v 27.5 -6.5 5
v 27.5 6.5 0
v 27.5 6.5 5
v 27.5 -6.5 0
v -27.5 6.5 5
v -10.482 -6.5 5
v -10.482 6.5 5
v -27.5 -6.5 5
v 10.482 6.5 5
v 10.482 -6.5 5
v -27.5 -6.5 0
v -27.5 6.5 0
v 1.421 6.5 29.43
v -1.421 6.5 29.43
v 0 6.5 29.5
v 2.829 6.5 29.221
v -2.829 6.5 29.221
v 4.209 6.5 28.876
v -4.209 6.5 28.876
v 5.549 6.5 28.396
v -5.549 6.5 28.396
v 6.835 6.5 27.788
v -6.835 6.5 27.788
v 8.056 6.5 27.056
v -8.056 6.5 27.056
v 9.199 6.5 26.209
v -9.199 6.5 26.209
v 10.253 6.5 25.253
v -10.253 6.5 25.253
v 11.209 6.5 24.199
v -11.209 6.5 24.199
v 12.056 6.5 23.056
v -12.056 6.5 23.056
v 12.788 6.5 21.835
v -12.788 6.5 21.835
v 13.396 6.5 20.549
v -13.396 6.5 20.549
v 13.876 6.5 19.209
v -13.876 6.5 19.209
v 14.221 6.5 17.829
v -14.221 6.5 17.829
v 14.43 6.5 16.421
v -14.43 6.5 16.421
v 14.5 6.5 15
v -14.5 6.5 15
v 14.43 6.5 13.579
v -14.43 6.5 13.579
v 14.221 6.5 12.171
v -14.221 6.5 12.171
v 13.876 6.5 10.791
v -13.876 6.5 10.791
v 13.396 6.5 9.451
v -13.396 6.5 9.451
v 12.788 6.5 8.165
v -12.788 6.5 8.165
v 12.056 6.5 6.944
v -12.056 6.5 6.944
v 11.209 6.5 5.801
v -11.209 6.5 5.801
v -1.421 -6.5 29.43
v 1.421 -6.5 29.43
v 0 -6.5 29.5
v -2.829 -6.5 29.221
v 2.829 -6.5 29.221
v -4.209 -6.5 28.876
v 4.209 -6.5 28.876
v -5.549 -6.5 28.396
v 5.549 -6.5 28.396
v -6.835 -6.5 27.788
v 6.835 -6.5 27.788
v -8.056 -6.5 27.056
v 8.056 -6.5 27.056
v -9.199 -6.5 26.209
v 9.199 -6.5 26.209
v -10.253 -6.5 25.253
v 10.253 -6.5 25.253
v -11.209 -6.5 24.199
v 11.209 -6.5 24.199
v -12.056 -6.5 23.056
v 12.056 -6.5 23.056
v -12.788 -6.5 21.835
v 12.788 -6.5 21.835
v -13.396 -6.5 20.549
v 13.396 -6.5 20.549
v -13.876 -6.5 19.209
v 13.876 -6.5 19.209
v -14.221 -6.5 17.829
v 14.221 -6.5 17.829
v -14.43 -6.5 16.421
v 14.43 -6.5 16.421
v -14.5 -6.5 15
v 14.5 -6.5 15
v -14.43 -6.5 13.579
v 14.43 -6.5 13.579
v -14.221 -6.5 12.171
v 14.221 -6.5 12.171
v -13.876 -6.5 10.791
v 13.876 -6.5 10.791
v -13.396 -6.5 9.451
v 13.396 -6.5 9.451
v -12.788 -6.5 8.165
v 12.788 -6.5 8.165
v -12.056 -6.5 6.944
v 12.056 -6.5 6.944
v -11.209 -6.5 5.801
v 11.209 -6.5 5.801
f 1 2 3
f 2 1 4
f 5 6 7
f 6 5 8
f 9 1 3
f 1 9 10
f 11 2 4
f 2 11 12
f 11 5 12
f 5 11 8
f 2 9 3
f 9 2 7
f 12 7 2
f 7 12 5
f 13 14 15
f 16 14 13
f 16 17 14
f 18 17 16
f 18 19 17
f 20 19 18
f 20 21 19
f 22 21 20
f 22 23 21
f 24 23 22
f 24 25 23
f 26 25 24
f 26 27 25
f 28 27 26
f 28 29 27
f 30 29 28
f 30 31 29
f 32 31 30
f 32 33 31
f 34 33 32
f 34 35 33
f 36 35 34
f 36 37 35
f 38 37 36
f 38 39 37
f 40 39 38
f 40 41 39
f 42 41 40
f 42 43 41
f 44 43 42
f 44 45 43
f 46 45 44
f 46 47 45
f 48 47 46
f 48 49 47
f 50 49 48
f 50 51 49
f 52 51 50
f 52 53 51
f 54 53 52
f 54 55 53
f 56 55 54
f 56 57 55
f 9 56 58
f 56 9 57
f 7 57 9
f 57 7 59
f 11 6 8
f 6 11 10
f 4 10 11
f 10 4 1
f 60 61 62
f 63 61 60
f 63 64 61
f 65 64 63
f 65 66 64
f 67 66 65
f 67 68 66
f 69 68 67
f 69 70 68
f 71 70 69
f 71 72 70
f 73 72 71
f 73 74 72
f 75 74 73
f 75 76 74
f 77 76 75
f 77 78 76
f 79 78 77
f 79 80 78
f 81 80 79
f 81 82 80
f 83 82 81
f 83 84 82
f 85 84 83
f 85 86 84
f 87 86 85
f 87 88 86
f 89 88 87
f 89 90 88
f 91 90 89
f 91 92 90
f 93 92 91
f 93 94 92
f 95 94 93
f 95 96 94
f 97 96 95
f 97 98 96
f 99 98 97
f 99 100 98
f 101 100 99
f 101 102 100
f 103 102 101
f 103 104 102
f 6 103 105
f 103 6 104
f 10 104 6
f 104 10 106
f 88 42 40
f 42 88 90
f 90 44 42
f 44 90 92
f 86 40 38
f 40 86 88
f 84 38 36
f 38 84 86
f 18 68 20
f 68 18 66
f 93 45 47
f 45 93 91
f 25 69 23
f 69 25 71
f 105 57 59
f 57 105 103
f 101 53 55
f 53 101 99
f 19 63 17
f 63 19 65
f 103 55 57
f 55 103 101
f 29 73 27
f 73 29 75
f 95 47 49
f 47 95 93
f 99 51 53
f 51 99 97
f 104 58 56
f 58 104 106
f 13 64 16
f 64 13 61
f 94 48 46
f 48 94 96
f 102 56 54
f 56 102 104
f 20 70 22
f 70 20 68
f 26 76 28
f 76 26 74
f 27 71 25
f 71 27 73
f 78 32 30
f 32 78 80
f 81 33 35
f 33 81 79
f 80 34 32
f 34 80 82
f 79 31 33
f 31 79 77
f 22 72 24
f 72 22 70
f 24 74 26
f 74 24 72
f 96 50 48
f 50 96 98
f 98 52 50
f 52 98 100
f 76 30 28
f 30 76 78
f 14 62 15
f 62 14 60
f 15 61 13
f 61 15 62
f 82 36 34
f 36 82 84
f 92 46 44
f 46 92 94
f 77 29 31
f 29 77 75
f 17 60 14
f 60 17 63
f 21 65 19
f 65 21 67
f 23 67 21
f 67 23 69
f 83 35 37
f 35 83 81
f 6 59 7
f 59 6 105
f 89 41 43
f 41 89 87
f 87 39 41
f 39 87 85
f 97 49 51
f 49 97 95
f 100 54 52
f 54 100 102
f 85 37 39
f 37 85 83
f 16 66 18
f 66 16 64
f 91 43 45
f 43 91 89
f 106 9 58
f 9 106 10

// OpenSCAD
/*
Author :    Guilherme Pontes (gpsgui)
github :    www.github.com/gpsgui

Release Notes

08/05/2020 -> Version 1.0.0
        Features:
            - 10 possibles presets(sk8 to sk40) of SAMICK-like SK shaft supports
            - Custom mode, generate a suport with arbitrary dimensions 
            - All holes with countersink or counterbore
            - Clamping with bolt and nut (with nut housing)
*/


/* [Hidden] */
$fn = 64;
// presets based on the catalog of zinc-die cast kp-series of Kugellager https://www.kugellager-express.de/silver-series-miniature-plummer-block-housing-unit-kp08-shaft-8-mm
// presets with parameters [ d, h, A, W, H, T, E, D, C, B, S, J ]
sk8  = [8, 20, 21, 42, 32.8, 6, 18, 5, 32, 14, 5.5, 4] ;
sk10 = [10, 20, 21, 42, 32.8, 6, 18, 5, 32, 14, 5.5, 4]; 
sk12 = [12, 23, 21, 42, 38, 6, 20, 5, 32, 14, 5.5, 4];
sk13 = [13, 23, 21, 42, 38, 6, 20, 5, 32, 14, 5.5, 4]; 
sk16 = [16, 27, 24, 48, 44, 8, 25, 5, 38, 16, 5.5, 4];
sk20 = [20, 31, 30, 60, 51, 10, 30, 7.5, 45, 20, 6.6, 5];
sk25 = [25, 35, 35, 70, 60, 12, 38, 7, 56, 24, 6.6, 6]; 
sk30 = [30, 42, 42, 84, 70, 12, 44, 10, 64, 28, 9, 6]; 
sk35 = [35, 50, 49, 98, 85, 15, 50, 12, 74, 32, 11, 8];
sk40 = [40, 60, 57, 114, 96, 15, 60, 12, 90, 36, 11, 8];
presets = [[], sk8, sk10, sk12, sk13, sk16, sk20, sk25, sk30, sk35, sk40];
/* [Select SK support preset] */
// If don't want to use a preset, choose "custom"
preset = 0; // [0:custom, 1:sk08, 2:sk10, 3:sk12, 4:sk13, 5:sk16, 6:sk20, 7:sk25, 8:sk30, 9:sk35, 10:sk40]
echo(preset);
/* [Custom dimensions] */
// shaft diameter
d = 8;    
// heigth of the shaft
h = 15;
// total width of the block
a = 55;
// total height
W = 29;
// base tickness
g = 5;
// distance between bolts
e = 42;
// thickness of support
b = 13;
// locking bolts hole diameter
s = 4.8;
// Grub Screw metric size
J = 4;
// half the bearing thickness
n = 3.5;
// size of the bearing clamping boss
L = 11.5;

/* [Finishing] */
// clearance
clearance = 0.1;
//bolt counterbore shape
bolt_counterbore_shape = "conical"; // [conical, hex, cylindrical]

difference(){
    union(){
        translate([0,0,g/2])cube([a,b,g], center = true);
        translate([0, 0, h])rotate([90,0,0]) cylinder(r = W/2, h = b, center = true); 
    }
    
}
